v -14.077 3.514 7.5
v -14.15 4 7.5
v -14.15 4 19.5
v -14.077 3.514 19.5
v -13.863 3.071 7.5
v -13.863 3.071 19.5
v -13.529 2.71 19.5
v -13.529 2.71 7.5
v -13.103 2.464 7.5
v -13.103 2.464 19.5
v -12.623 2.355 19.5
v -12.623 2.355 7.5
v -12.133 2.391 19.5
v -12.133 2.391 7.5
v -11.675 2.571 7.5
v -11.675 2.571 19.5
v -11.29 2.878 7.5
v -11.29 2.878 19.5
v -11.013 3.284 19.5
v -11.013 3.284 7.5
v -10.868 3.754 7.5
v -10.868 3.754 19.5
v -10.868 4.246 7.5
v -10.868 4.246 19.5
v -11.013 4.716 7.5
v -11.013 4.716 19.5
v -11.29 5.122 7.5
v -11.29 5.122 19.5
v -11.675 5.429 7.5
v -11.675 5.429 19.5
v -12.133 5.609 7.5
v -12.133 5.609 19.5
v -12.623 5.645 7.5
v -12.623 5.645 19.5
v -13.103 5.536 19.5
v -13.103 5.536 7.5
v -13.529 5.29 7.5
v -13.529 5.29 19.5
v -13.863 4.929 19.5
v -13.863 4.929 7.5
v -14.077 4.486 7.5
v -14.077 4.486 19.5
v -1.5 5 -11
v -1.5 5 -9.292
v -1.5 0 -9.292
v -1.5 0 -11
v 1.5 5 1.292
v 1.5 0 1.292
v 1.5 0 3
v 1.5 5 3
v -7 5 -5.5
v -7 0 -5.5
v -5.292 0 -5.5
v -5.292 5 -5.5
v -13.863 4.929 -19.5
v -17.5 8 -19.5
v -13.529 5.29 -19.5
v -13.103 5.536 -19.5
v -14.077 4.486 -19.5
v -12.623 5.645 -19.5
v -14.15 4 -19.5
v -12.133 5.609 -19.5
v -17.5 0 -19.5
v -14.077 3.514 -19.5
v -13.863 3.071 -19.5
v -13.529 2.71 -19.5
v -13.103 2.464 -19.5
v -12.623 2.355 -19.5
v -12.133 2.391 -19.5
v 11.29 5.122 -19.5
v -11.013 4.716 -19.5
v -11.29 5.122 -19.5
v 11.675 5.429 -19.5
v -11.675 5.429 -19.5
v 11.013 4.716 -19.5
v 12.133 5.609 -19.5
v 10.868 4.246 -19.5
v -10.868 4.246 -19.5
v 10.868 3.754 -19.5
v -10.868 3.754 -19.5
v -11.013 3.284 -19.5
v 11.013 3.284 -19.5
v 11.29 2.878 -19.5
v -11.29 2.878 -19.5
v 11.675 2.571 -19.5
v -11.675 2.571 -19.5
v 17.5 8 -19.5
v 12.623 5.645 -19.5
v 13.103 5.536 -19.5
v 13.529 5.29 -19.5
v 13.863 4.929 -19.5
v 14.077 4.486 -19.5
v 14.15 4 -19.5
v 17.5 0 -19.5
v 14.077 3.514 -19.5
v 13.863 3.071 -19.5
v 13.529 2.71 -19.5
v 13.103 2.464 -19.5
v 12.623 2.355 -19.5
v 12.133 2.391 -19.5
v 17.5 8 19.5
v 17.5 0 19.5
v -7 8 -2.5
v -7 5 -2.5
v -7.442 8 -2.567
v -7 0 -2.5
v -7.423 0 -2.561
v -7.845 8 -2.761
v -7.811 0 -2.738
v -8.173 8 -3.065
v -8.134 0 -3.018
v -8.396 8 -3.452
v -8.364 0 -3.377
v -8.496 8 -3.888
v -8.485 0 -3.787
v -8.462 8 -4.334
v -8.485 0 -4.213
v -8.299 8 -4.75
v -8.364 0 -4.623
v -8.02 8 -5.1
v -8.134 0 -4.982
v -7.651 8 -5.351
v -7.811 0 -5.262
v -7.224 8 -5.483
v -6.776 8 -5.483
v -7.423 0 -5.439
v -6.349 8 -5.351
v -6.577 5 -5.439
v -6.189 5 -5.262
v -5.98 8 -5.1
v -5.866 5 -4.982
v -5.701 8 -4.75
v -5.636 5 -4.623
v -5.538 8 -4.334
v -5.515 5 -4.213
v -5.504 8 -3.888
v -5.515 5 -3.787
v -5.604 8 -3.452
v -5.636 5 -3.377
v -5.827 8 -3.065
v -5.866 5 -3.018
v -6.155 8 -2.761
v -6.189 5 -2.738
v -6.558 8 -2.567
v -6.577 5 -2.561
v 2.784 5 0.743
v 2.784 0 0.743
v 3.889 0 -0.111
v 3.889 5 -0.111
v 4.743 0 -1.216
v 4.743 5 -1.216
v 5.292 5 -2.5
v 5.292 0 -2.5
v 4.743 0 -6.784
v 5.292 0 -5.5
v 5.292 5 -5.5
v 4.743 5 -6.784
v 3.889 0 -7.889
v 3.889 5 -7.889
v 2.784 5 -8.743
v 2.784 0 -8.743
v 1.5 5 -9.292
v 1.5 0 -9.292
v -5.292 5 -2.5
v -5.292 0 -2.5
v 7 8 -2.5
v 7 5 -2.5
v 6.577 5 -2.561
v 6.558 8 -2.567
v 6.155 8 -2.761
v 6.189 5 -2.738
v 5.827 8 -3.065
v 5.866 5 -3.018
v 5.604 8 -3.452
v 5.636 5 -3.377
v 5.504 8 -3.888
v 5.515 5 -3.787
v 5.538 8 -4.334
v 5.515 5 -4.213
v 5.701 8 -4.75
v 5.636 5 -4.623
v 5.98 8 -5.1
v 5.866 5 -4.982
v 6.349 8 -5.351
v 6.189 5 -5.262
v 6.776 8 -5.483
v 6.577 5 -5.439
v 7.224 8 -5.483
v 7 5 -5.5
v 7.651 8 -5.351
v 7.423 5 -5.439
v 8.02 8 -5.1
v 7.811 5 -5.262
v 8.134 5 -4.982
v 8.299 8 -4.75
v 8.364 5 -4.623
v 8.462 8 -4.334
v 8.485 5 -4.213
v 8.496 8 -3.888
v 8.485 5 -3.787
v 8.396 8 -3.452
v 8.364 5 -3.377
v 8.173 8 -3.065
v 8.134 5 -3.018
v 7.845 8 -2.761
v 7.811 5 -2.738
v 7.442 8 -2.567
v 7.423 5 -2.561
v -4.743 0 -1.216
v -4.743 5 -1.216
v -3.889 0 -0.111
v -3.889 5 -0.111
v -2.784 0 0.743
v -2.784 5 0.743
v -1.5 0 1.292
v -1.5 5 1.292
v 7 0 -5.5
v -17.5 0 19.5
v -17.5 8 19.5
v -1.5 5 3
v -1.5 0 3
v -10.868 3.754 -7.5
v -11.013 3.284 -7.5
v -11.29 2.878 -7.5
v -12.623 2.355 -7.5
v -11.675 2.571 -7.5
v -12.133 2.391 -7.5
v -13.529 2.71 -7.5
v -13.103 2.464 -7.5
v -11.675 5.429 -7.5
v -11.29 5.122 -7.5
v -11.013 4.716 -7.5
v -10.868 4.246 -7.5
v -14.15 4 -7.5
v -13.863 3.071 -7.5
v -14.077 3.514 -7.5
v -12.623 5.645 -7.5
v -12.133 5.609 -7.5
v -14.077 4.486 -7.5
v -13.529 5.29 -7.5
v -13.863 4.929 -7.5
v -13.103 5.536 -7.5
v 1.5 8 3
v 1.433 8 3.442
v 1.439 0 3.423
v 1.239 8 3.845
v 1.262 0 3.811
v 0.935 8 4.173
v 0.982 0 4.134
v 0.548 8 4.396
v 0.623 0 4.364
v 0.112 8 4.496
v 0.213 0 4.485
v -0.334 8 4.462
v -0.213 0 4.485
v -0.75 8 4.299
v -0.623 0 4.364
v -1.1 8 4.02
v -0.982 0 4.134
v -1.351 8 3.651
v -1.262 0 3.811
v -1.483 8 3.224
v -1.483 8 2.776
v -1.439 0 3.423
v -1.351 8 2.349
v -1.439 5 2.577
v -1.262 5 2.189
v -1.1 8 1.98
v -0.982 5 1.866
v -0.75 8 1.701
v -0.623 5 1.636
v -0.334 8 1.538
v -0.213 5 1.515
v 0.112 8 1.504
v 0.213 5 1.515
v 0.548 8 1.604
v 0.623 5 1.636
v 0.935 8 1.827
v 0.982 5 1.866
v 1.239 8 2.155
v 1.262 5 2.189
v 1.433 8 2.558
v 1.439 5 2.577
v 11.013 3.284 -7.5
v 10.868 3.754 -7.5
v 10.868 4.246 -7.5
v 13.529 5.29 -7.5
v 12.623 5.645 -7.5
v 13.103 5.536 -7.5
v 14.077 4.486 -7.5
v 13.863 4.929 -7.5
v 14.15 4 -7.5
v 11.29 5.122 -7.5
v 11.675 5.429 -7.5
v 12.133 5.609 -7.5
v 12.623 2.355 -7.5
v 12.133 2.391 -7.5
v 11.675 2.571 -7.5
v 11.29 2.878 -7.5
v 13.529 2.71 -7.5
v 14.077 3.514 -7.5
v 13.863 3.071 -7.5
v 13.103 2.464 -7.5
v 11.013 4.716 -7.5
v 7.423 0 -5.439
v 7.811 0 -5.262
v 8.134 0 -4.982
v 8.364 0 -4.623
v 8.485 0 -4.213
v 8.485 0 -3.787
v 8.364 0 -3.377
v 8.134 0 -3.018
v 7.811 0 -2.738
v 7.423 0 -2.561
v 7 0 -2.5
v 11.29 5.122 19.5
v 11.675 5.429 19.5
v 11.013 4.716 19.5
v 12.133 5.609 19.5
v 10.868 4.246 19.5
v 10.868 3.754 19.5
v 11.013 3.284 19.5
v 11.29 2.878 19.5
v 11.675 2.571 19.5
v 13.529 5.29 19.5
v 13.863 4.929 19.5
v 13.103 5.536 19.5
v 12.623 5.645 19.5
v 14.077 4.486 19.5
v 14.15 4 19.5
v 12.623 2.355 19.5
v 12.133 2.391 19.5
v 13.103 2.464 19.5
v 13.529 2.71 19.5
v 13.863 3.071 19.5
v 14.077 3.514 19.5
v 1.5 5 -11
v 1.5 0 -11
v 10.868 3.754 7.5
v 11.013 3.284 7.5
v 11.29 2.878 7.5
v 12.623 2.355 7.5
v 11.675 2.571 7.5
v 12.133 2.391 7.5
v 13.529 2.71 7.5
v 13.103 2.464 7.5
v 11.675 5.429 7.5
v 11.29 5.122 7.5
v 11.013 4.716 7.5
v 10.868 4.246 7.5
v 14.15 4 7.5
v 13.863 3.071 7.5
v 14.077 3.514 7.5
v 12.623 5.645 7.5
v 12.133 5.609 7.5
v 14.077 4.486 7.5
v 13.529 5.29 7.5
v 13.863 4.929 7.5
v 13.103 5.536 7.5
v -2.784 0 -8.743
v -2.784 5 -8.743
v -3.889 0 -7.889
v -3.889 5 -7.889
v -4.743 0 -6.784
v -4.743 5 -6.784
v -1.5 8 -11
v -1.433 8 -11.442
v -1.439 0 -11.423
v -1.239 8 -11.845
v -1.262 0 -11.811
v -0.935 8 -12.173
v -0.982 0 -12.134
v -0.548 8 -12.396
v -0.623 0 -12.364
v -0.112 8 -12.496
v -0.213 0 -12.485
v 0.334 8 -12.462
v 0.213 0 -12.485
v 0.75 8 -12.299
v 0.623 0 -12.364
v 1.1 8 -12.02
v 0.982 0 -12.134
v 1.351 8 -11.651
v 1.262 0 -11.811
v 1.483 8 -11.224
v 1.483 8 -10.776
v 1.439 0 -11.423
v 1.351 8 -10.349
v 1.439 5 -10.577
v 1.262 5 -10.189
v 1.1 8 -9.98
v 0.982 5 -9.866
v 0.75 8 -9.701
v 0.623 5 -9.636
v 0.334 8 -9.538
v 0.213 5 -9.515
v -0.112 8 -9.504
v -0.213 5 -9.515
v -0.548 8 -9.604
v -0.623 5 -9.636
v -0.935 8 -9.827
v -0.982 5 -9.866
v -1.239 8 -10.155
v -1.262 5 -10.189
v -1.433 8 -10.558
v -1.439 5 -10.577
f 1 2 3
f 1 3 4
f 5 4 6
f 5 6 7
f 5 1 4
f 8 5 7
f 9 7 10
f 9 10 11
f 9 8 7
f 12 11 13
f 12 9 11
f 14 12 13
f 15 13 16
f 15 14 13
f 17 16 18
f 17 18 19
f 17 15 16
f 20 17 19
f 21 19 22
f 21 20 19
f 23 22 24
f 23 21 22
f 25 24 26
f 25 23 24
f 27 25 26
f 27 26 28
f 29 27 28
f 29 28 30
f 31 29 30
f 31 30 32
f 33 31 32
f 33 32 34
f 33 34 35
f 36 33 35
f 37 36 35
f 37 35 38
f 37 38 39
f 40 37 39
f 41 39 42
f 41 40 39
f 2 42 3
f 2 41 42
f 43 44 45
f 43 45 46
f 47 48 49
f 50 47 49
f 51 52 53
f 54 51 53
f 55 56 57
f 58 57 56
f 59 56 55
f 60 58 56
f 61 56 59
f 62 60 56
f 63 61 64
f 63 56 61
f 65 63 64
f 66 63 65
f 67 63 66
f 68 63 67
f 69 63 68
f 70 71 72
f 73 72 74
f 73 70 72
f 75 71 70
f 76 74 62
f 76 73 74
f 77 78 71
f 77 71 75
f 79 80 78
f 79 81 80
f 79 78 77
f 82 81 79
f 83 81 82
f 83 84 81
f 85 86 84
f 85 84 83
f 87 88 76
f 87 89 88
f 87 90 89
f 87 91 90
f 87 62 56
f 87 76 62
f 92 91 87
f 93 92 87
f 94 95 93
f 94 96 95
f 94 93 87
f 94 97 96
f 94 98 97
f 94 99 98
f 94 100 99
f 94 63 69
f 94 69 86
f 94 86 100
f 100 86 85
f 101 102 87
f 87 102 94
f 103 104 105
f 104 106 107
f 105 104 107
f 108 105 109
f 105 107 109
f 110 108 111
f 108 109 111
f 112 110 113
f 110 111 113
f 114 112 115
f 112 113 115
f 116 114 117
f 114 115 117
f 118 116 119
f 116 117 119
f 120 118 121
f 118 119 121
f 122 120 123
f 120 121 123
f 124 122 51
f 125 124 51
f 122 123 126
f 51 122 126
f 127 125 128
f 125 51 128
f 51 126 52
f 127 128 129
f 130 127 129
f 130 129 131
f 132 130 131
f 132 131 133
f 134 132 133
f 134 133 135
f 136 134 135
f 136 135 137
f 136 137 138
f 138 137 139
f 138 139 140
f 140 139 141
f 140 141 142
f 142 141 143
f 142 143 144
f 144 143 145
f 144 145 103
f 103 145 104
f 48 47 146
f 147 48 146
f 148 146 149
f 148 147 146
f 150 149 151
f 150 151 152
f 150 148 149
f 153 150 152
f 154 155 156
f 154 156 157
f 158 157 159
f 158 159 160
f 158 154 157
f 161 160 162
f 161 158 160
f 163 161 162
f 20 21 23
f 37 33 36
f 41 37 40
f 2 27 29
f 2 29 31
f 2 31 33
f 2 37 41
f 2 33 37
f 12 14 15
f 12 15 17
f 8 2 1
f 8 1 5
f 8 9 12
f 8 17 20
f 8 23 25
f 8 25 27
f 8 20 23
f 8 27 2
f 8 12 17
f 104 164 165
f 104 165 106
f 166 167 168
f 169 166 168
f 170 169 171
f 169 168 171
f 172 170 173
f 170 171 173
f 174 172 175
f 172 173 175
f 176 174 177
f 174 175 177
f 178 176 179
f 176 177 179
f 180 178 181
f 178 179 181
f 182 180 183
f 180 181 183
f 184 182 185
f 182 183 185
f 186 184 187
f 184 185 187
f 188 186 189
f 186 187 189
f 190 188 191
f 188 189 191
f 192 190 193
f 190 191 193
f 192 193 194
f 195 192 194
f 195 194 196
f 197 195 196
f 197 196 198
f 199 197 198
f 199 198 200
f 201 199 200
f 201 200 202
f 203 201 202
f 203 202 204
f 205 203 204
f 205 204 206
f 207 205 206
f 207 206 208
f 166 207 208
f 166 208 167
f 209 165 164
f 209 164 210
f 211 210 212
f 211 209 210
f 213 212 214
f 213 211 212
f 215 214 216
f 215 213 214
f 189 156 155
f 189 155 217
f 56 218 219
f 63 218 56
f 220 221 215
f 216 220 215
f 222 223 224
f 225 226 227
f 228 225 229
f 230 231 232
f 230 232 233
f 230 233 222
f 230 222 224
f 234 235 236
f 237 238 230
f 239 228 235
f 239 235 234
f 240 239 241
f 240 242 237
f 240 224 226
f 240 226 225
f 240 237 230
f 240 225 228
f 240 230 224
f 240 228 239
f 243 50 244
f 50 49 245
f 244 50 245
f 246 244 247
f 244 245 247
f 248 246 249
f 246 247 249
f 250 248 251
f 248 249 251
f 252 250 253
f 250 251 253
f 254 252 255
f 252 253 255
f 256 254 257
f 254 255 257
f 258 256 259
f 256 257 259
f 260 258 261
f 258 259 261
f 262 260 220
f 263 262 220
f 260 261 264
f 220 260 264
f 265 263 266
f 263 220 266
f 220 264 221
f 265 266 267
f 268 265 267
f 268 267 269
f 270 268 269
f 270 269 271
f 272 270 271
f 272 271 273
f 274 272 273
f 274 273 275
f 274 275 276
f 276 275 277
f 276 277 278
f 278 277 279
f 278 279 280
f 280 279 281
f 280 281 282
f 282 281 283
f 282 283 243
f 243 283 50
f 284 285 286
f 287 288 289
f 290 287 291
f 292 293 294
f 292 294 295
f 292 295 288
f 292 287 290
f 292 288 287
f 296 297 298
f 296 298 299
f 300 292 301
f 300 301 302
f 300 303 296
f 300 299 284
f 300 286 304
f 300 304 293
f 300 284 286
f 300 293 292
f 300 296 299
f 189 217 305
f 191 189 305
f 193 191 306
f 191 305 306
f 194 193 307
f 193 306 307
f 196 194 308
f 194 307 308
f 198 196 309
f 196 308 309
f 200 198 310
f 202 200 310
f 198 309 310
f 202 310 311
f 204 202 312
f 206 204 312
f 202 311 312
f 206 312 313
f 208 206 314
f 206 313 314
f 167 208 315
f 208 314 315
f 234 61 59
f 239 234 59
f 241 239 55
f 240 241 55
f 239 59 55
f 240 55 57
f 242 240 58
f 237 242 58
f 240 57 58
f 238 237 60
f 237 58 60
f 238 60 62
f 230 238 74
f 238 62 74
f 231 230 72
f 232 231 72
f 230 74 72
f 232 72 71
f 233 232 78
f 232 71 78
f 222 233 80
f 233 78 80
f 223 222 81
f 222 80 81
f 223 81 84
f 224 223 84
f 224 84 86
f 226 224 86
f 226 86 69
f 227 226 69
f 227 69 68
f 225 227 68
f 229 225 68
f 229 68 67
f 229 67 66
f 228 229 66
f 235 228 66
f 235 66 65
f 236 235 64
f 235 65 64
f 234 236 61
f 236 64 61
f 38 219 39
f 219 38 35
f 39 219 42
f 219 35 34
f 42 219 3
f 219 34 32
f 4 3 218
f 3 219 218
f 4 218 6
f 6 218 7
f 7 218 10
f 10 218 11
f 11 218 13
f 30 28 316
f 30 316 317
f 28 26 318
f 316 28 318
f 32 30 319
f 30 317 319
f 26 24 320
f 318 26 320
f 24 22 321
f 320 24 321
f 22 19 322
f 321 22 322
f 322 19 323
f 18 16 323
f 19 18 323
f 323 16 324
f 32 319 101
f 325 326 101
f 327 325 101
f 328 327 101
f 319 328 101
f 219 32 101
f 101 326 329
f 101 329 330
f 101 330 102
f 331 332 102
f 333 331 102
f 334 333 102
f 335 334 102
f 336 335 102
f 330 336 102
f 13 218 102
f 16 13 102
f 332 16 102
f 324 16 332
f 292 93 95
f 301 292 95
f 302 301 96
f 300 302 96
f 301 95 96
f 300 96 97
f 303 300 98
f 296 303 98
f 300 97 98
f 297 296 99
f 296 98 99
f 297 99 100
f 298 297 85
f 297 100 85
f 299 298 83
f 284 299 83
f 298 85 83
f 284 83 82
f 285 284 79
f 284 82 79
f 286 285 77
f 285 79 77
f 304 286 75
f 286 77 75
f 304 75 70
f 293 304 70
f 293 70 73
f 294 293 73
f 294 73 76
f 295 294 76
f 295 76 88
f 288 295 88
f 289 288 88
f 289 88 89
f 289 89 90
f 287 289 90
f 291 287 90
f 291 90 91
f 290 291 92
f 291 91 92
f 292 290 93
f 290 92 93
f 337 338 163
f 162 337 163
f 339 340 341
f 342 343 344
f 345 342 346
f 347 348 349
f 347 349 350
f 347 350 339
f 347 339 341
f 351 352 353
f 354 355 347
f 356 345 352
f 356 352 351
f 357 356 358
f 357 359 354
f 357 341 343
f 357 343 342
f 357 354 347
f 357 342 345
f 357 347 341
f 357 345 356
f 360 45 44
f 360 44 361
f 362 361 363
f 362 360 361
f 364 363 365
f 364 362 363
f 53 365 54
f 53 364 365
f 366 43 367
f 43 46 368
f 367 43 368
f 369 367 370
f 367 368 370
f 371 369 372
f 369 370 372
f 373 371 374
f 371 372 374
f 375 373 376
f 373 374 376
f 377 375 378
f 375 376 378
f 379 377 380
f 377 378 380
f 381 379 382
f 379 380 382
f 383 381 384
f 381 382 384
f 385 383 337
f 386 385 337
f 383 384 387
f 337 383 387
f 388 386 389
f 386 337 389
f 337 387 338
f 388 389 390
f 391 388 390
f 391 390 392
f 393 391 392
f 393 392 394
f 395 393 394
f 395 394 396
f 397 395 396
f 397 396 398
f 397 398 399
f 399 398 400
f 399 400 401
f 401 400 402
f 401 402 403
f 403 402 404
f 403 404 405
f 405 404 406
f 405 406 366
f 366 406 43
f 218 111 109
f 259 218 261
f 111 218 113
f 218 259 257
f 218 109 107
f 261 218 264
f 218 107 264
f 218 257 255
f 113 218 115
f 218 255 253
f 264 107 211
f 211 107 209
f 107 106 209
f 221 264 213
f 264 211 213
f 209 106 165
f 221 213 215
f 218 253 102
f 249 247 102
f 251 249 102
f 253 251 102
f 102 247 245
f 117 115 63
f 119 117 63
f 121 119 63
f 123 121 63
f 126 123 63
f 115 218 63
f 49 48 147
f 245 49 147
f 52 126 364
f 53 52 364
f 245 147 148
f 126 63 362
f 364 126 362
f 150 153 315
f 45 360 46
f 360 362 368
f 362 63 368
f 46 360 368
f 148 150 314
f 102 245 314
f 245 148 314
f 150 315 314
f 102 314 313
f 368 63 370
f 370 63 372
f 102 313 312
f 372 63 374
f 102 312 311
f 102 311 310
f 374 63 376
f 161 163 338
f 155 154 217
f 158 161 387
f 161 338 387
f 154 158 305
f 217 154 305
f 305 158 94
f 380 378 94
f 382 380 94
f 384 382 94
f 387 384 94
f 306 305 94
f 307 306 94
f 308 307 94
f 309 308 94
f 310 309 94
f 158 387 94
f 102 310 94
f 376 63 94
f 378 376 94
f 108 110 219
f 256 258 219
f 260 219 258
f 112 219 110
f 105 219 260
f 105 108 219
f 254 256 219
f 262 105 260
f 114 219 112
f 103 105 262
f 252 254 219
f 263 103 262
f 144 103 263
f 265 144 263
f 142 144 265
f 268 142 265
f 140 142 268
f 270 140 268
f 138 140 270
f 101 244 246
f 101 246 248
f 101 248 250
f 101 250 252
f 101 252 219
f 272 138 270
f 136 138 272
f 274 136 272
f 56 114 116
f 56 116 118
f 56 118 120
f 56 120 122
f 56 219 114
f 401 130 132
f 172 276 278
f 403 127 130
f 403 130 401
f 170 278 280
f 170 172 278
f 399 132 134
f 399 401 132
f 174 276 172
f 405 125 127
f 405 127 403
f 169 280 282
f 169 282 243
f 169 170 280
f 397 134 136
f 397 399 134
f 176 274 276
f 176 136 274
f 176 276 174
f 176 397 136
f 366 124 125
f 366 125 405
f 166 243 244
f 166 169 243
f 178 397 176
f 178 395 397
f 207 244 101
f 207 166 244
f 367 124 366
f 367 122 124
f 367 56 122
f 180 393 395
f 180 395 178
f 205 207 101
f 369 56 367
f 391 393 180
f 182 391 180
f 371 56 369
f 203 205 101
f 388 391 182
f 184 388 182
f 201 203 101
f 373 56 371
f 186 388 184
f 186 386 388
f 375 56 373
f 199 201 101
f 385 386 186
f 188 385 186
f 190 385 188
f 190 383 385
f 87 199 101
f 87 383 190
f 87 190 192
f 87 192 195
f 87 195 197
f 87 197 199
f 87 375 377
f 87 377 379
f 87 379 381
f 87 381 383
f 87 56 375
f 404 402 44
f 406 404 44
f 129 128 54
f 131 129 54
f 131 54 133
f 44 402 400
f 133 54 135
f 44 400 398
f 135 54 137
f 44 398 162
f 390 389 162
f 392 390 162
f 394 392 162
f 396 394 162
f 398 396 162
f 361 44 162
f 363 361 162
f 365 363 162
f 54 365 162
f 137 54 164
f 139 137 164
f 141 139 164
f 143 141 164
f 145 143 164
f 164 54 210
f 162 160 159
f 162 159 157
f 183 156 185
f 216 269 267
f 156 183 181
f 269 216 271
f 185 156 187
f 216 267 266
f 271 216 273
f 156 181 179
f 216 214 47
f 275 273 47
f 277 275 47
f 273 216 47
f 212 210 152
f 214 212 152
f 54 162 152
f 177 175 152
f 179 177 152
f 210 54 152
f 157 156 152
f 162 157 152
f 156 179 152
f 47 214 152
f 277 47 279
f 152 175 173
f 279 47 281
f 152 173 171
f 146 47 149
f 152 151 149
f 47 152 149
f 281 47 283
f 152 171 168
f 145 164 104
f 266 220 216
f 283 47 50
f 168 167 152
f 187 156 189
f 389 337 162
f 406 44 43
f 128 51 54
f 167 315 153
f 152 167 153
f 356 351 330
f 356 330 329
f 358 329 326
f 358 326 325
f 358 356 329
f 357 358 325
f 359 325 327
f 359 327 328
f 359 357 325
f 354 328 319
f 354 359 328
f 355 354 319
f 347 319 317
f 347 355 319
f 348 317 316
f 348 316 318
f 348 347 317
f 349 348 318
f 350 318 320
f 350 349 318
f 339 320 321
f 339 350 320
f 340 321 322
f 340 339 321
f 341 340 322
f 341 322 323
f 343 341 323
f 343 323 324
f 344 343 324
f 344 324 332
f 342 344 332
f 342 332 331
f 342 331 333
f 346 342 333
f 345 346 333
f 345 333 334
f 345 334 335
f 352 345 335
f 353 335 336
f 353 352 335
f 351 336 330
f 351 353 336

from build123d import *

# Parameters (mm, degrees)
SKETCH_1_W          = 35
SKETCH_1_H          = 39
EXTRUDE_1_DEPTH     = 8
SKETCH_2_R          = 1.65
CUT_EXTRUDE_1_DEPTH = 12
SKETCH_5_R          = 5.5
CUT_EXTRUDE_3_DEPTH = 5
CUT_EXTRUDE_5_DEPTH = 5
SKETCH_8_R          = 1.5
CUT_EXTRUDE_6_DEPTH = 5
CUT_EXTRUDE_START   = -12
SKETCH_9_R          = 1.65
CUT_EXTRUDE_7_DEPTH = 12


with BuildPart() as part:
    # 草图1 → 凸台-拉伸1 (new body)
    with BuildSketch(Plane(origin=(0, 0, 0), x_dir=(1, 0, 0), z_dir=(0, 1, 0))):
        Rectangle(SKETCH_1_W, SKETCH_1_H)
    extrude(amount=EXTRUDE_1_DEPTH)

    # 草图2 → 切除-拉伸1 (cut)
    with BuildSketch(Plane(origin=(0, 0, -19.5), x_dir=(-1, 0, 0), z_dir=(0, 0, -1))):
        with Locations((12.5, 4)):
            Circle(SKETCH_2_R)
        with Locations(Location((-12.5, 4, 0), (0, 0, 180))):
            Circle(SKETCH_2_R)
    extrude(amount=-CUT_EXTRUDE_1_DEPTH, mode=Mode.SUBTRACT)

    # 草图5 → 切除-拉伸3 (cut)
    with BuildSketch(Plane(origin=(0, 0, 0), x_dir=(1, 0, 0), z_dir=(0, 1, 0))):
        with Locations(Location((0, 4, 0), (0, 0, 270))):
            Circle(SKETCH_5_R)
    extrude(amount=CUT_EXTRUDE_3_DEPTH, mode=Mode.SUBTRACT)

    # 草图7 → 切除-拉伸5 (cut)
    with BuildSketch(Plane.XZ):
        with BuildLine():
            Line((1.5, -11), (1.5, -9))
            Line((1.5, -9), (-1.5, -9))
            Line((-1.5, -9), (-1.5, -11))
            ThreePointArc((-1.5, -11), (0, -12.5), (1.5, -11))
        make_face()
        with BuildLine():
            Line((-7, -5.5), (-5, -5.5))
            Line((-5, -5.5), (-5, -2.5))
            Line((-5, -2.5), (-7, -2.5))
            ThreePointArc((-7, -2.5), (-8.5, -4), (-7, -5.5))
        make_face()
        with BuildLine():
            Line((-1.5, 3), (-1.5, 1))
            Line((-1.5, 1), (1.5, 1))
            Line((1.5, 1), (1.5, 3))
            ThreePointArc((1.5, 3), (0, 4.5), (-1.5, 3))
        make_face()
        with BuildLine():
            Line((7, -2.5), (5, -2.5))
            Line((5, -2.5), (5, -5.5))
            Line((5, -5.5), (7, -5.5))
            ThreePointArc((7, -5.5), (8.5, -4), (7, -2.5))
        make_face()
    extrude(amount=-CUT_EXTRUDE_5_DEPTH, mode=Mode.SUBTRACT)

    # 草图8 → 切除-拉伸6 (cut)
    with BuildSketch(Plane.XZ.offset(-5)):
        with Locations(Location((0, -11, 0), (0, 0, 180))):
            Circle(SKETCH_8_R)
        with Locations(Location((7, -4, 0), (0, 0, 90))):
            Circle(SKETCH_8_R)
        with Locations((0, 3)):
            Circle(SKETCH_8_R)
        with Locations(Location((-7, -4, 0), (0, 0, 90))):
            Circle(SKETCH_8_R)
    extrude(amount=-CUT_EXTRUDE_6_DEPTH, mode=Mode.SUBTRACT)

    # 草图9 → 切除-拉伸7 (cut)
    with BuildSketch(Plane.XY.offset(19.5).offset(CUT_EXTRUDE_START)):
        with Locations(Location((-12.5, 4, 0), (0, 0, 180))):
            Circle(SKETCH_9_R)
        with Locations((12.5, 4)):
            Circle(SKETCH_9_R)
    extrude(amount=CUT_EXTRUDE_7_DEPTH, mode=Mode.SUBTRACT)


solid = part.part
